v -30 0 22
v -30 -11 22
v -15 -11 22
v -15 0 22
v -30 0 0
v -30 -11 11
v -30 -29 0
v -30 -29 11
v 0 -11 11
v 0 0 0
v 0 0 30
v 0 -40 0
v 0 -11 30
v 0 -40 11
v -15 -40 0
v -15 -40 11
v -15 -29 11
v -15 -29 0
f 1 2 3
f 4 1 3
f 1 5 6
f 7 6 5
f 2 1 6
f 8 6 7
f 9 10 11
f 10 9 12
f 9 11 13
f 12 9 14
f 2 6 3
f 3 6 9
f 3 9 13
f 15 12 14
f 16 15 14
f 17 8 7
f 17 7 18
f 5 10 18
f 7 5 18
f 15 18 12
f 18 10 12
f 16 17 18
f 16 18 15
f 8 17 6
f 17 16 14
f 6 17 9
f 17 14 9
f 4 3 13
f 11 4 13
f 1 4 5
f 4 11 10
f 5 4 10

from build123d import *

# Parameters (mm, degrees)
F1_DEPTH = 30
F2_W     = 11
F2_H     = 15
F3_DEPTH = 11
F4_W     = 15
F4_H     = 8
F5_DEPTH = 11
F6_ANGLE = -90
F8_DEPTH = 11.001


with BuildPart() as f1:
    # F0 (on Front) → F1 (new body)
    with BuildSketch(Plane.XZ):
        Polygon((0, 30), (0, 0), (40, 0), (40, 11), (11, 11), (11, 30), align=None)
    extrude(amount=F1_DEPTH)

    # F2 (on face) → F3 (cut, through all)
    with BuildSketch(Plane.XY.offset(11)):
        with Locations((34.5, -22.5)):
            Rectangle(F2_W, F2_H)
    extrude(amount=-F3_DEPTH, mode=Mode.SUBTRACT)

    # F4 (on face) → F5 (cut, through all)
    with BuildSketch(Plane.YZ.offset(11)):
        with Locations((-22.5, 26)):
            Rectangle(F4_W, F4_H)
    extrude(amount=-F5_DEPTH, mode=Mode.SUBTRACT)


with BuildPart() as f1_1:
    # F6: moved
    add(f1.part.rotate(Axis((0, 0, 15), (0, 0, 1)), F6_ANGLE))

    # F7 (on face) → F8 (cut, through all)
    with BuildSketch(Plane.XZ.offset(11)):
        Polygon((-7.5, 26), (-15, 30), (-15, 22), align=None)
        Polygon((0, 30), (-15, 30), (-7.5, 26), align=None)
    extrude(amount=-F8_DEPTH, mode=Mode.SUBTRACT)


solid = f1_1.part
